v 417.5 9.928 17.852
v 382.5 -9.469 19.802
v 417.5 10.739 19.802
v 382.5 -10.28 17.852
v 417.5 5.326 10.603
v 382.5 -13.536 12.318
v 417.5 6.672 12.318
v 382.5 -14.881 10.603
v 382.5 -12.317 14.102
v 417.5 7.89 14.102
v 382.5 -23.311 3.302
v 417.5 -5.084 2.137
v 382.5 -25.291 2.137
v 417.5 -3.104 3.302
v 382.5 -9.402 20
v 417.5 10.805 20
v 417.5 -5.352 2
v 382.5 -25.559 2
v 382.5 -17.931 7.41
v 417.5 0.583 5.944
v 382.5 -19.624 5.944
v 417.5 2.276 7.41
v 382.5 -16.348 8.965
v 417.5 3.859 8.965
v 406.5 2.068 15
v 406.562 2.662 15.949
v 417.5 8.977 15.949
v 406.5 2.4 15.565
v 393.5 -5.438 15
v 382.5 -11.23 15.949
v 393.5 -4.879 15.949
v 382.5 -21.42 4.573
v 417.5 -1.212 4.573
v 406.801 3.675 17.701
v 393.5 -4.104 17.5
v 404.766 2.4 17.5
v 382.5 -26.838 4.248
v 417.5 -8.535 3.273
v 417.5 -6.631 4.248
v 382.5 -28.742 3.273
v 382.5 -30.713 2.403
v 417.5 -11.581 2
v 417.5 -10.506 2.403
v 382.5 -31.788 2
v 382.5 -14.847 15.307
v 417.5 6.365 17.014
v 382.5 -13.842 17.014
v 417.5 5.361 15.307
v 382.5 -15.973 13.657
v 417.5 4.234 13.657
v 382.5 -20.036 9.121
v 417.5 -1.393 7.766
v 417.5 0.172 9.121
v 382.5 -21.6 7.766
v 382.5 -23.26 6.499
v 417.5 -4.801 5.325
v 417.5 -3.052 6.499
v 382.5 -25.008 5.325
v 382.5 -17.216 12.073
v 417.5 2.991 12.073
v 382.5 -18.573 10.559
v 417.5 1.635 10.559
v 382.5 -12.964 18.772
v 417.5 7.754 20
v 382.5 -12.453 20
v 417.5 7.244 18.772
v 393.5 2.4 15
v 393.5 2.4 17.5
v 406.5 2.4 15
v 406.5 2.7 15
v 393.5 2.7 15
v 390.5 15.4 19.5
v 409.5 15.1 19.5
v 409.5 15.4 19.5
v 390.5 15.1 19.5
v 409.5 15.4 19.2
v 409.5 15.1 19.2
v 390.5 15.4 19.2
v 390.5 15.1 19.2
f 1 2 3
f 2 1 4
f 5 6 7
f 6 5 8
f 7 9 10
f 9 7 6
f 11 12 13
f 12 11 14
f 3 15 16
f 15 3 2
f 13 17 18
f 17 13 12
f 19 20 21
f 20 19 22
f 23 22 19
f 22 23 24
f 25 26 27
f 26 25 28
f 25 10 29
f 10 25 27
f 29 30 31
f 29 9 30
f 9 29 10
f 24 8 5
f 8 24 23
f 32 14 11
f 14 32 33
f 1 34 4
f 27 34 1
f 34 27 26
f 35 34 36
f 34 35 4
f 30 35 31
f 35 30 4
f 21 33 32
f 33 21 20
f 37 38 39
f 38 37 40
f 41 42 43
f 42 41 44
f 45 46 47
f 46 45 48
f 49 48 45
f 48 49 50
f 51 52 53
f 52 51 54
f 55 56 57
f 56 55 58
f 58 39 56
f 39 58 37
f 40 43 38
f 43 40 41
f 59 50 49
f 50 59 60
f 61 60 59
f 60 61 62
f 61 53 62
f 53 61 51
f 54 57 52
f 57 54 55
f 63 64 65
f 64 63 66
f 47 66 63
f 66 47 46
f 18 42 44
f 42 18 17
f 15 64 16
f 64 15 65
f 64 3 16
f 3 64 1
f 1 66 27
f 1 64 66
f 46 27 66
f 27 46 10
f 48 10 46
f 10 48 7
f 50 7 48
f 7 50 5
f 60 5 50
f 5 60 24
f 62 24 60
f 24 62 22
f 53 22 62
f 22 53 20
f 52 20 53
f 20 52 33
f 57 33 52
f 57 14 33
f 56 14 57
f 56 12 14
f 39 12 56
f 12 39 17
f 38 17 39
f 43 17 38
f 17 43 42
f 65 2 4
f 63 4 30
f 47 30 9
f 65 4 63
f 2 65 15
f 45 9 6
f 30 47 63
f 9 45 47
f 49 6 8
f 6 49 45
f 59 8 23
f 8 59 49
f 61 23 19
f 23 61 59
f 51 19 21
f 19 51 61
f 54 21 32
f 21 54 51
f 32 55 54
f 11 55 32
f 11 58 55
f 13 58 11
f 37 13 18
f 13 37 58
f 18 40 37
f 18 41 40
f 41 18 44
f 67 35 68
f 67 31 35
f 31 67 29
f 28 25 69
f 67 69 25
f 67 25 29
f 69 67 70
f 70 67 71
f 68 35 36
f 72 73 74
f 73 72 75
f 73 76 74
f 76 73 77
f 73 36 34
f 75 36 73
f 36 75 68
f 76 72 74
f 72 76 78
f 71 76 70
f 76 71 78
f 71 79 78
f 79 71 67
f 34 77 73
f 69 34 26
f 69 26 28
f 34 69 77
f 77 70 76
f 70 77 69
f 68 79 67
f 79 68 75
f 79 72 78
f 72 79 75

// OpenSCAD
thick = 2.5;
min_thick = 0.3;
fix = 0.1;
trapeze_b_min=13;
trapeze_b_maj=19;
trapeze_h = 13;
trapeze_z_shift = 2;
trapeze_z_top = 18;
trapeze_z_bottom = 15;


module trapeze() {
    translate([0, thick-fix, trapeze_z_bottom])
    hull() {

        translate([-trapeze_b_maj/2,trapeze_h-min_thick,thick-min_thick+trapeze_z_shift])
        cube([trapeze_b_maj,min_thick,min_thick]);

        translate([-trapeze_b_min/2,0,thick-min_thick])
        cube([trapeze_b_min,min_thick,min_thick]);

        translate([-trapeze_b_min/2,0,0])
        cube([trapeze_b_min,min_thick,min_thick]);
    }
}

module extension(length_tl, length_tr=length_tl, length_bl=length_tl, length_br=length_tl) {
    translate([-trapeze_b_min/2,thick-length,trapeze_z_bottom-shovel_z_bottom])
    cube([trapeze_b_min, length, thick]);

}

module extension_fine(length_tl, length_tr, length_bl, length_br) {
    translate([-trapeze_b_min/2,thick,trapeze_z_bottom-shovel_z_bottom])
    hull() {

        translate([0,-length_bl,0])
        cube([min_thick, length_bl, min_thick]);

        translate([trapeze_b_min-min_thick,-length_br,0])
        cube([min_thick, length_br, min_thick]);

        translate([0,-length_tl,thick-min_thick])
        cube([min_thick, length_tl, min_thick]);

        translate([trapeze_b_min-min_thick,-length_tr,thick-min_thick])
        cube([min_thick, length_tr, min_thick]);
    }

}

shovel_width = 35;
shovel_height = 18;
shovel_z_bottom = 2;


module shovel1() {
    translate([-shovel_width/2,0,0])
    cube([shovel_width,thick,shovel_height]);
}


module shovel2() {
    slope = 28;


    translate([-shovel_width/2,0,0])
    hull() {
        translate([0,0,shovel_height-min_thick])
        cube([shovel_width,thick,min_thick]);

        translate([0,-slope,0])
        cube([shovel_width,thick,min_thick]);
    }

    extension(6.16);

}

module shovel3(r=20) {

    $fn=100;

    cube_width = shovel_width+fix*2;
    cube_length = r*4;
    cube_height = r*2;

    shift = 0;

    translate([0,thick-shift,0])
    difference() {
        translate([0,-r,shovel_height/2])
        rotate([0,90,0])
        cylinder(r=r,h=shovel_width, center=true);

        translate([0,-r,shovel_height/2])
        rotate([0,90,0])
        cylinder(r=r-thick,h=shovel_width+fix*2, center=true);

        translate([0,0,-cube_height/2])
        cube([cube_width,cube_length,cube_height], center=true);

        translate([0,0,cube_height/2+shovel_height])
        cube([cube_width,cube_length,cube_height], center=true);

        translate([0,-cube_length/2-r,cube_height/2-fix])
        cube([cube_width,cube_length,cube_height], center=true);

    }

    extension(3);

}


module shovel4(r=30) {

    $fn=100;

    cube_width = r*4;
    cube_length = r*4;
    cube_height = r*2;

    shift = 0;

    translate([0,thick-shift,0])
    difference() {
        translate([0,-r,shovel_height/2])
        rotate([0,0,0])
        cylinder(r=r,h=shovel_width, center=true);

        translate([0,-r,shovel_height/2])
        rotate([0,0,0])
        cylinder(r=r-thick,h=shovel_width+fix*2, center=true);

        translate([0,0,-cube_height/2])
        cube([cube_width,cube_length,cube_height], center=true);

        translate([0,0,cube_height/2+shovel_height])
        cube([cube_width,cube_length,cube_height], center=true);

        translate([cube_width/2+shovel_width/2,0,cube_height/2-fix])
        cube([cube_width,cube_length,cube_height], center=true);

        translate([-cube_width/2-shovel_width/2,0,cube_height/2-fix])
        cube([cube_width,cube_length,cube_height], center=true);

        translate([0,-cube_length/2-r,cube_height/2-fix])
        cube([cube_width,cube_length,cube_height], center=true);

    }

    extension(2);

}

module shovel5(r=30) {

    $fn=100;

    cube_width = r*4;
    cube_length = r*4;
    cube_height = r*2;

    shift = 0;

    translate([0,thick-shift,0])
    difference() {
        translate([0,-r,shovel_height/2])
        rotate([0,0,0])
        sphere(r=r, center=true);

        translate([0,-r,shovel_height/2])
        rotate([0,0,0])
        sphere(r=r-thick, center=true);

        translate([0,0,-cube_height/2])
        cube([cube_width,cube_length,cube_height], center=true);

        translate([0,0,cube_height/2+shovel_height])
        cube([cube_width,cube_length,cube_height], center=true);

        translate([cube_width/2+shovel_width/2,0,cube_height/2-fix])
        cube([cube_width,cube_length,cube_height], center=true);

        translate([-cube_width/2-shovel_width/2,0,cube_height/2-fix])
        cube([cube_width,cube_length,cube_height], center=true);

        translate([0,-cube_length/2-r,cube_height/2-fix])
        cube([cube_width,cube_length,cube_height], center=true);

    }

    extension(2);

}

module shovel6(r=33) {

    $fn=100;

    cube_width = shovel_width+fix*2;
    cube_length = r*4;
    cube_height = r*2;

    shift = 0;

    cyl_z = 10;

    translate([0,thick-shift,0])
    difference() {
        translate([0,-r,shovel_height+cyl_z])
        rotate([0,90,0])
        cylinder(r=r,h=shovel_width, center=true);

        translate([0,-r,shovel_height+cyl_z])
        rotate([0,90,0])
        cylinder(r=r-thick,h=shovel_width+fix*2, center=true);

        translate([0,0,-cube_height/2])
        cube([cube_width,cube_length,cube_height], center=true);

        translate([0,0,cube_height/2+shovel_height])
        cube([cube_width,cube_length,cube_height], center=true);

        translate([cube_width/2+shovel_width/2,0,cube_height/2-fix])
        cube([cube_width,cube_length,cube_height], center=true);

        translate([-cube_width/2-shovel_width/2,0,cube_height/2-fix])
        cube([cube_width,cube_length,cube_height], center=true);

        translate([0,-cube_length/2-r,cube_height/2-fix])
        cube([cube_width,cube_length,cube_height], center=true);

    }

    extension(4);

}


module shovel7(r=40) {

    $fn=100;

    cube_width = shovel_width+fix*2;
    cube_length = r*4;
    cube_height = r*2;

    cyl_z =16;
    sph_z = 13;
    sph_y = 1.5;
    mul = 1.15;
    shift = 0.8;

    translate([0,thick,0])
    difference() {
        translate([0,-r,shovel_height+cyl_z])
        rotate([0,90,0])
        cylinder(r=r,h=shovel_width, center=true);

        translate([r*shift,-r*mul-thick+sph_y,shovel_height+sph_z])
        sphere(r=r*mul, center=true);

        translate([-r*shift,-r*mul-thick+sph_y,shovel_height+sph_z])
        sphere(r=r*mul, center=true);

        translate([0,0,-cube_height/2])
        cube([cube_width,cube_length,cube_height], center=true);

        translate([0,0,cube_height/2+shovel_height])
        cube([cube_width,cube_length,cube_height], center=true);

        translate([cube_width/2+shovel_width/2,0,cube_height/2-fix])
        cube([cube_width,cube_length,cube_height], center=true);

        translate([-cube_width/2-shovel_width/2,0,cube_height/2-fix])
        cube([cube_width,cube_length,cube_height], center=true);

        translate([0,-cube_length/2-r,cube_height/2-fix])
        cube([cube_width,cube_length,cube_height], center=true);

    }

    extension(6);

}

module shovel8(r=33) {

    $fn=100;

    cube_width = 300;
    cube_length = 300;
    cube_height = 300;

    shift = 0;

    cyl_z = 10;

    translate([0,thick-shift,0])
    difference() {
        rotate([0,0,30])
        difference() {
            translate([0,-r,shovel_height+cyl_z])
            rotate([0,90,0])
            cylinder(r=r,h=cube_width, center=true);

            translate([0,-r,shovel_height+cyl_z])
            rotate([0,90,0])
            cylinder(r=r-thick,h=cube_width+fix*2, center=true);

            translate([0,-cube_length/2-r,cube_height/2-fix])
            cube([cube_width+fix*2,cube_length,cube_height], center=true);

            translate([0,0,-cube_height/2])
            cube([cube_width+fix*2,cube_length,cube_height], center=true);

            translate([0,0,cube_height/2+shovel_height])
            cube([cube_width+fix*2,cube_length,cube_height], center=true);
        }




        translate([cube_width/2+shovel_width/2,0,cube_height/2-fix])
        cube([cube_width,cube_length,cube_height], center=true);

        translate([-cube_width/2-shovel_width/2,0,cube_height/2-fix])
        cube([cube_width,cube_length,cube_height], center=true);


    }

    extension_fine(8,2,8,2);

}

module shovel(i=1) {
    if (i==1)
        shovel1();
    if (i==2)
        shovel2();
    if (i==3)
        shovel3();
    if (i==4)
        shovel4();
    if (i==5)
        shovel5();
    if (i==6)
        shovel6();
    if (i==7)
        shovel7();
    if (i==8)
        shovel8();
}


for (i=[8:8]) {
    translate([50*i,0,0])
    union() {
        trapeze();
        translate([0,0,shovel_z_bottom])
        shovel(i);
    }
}
